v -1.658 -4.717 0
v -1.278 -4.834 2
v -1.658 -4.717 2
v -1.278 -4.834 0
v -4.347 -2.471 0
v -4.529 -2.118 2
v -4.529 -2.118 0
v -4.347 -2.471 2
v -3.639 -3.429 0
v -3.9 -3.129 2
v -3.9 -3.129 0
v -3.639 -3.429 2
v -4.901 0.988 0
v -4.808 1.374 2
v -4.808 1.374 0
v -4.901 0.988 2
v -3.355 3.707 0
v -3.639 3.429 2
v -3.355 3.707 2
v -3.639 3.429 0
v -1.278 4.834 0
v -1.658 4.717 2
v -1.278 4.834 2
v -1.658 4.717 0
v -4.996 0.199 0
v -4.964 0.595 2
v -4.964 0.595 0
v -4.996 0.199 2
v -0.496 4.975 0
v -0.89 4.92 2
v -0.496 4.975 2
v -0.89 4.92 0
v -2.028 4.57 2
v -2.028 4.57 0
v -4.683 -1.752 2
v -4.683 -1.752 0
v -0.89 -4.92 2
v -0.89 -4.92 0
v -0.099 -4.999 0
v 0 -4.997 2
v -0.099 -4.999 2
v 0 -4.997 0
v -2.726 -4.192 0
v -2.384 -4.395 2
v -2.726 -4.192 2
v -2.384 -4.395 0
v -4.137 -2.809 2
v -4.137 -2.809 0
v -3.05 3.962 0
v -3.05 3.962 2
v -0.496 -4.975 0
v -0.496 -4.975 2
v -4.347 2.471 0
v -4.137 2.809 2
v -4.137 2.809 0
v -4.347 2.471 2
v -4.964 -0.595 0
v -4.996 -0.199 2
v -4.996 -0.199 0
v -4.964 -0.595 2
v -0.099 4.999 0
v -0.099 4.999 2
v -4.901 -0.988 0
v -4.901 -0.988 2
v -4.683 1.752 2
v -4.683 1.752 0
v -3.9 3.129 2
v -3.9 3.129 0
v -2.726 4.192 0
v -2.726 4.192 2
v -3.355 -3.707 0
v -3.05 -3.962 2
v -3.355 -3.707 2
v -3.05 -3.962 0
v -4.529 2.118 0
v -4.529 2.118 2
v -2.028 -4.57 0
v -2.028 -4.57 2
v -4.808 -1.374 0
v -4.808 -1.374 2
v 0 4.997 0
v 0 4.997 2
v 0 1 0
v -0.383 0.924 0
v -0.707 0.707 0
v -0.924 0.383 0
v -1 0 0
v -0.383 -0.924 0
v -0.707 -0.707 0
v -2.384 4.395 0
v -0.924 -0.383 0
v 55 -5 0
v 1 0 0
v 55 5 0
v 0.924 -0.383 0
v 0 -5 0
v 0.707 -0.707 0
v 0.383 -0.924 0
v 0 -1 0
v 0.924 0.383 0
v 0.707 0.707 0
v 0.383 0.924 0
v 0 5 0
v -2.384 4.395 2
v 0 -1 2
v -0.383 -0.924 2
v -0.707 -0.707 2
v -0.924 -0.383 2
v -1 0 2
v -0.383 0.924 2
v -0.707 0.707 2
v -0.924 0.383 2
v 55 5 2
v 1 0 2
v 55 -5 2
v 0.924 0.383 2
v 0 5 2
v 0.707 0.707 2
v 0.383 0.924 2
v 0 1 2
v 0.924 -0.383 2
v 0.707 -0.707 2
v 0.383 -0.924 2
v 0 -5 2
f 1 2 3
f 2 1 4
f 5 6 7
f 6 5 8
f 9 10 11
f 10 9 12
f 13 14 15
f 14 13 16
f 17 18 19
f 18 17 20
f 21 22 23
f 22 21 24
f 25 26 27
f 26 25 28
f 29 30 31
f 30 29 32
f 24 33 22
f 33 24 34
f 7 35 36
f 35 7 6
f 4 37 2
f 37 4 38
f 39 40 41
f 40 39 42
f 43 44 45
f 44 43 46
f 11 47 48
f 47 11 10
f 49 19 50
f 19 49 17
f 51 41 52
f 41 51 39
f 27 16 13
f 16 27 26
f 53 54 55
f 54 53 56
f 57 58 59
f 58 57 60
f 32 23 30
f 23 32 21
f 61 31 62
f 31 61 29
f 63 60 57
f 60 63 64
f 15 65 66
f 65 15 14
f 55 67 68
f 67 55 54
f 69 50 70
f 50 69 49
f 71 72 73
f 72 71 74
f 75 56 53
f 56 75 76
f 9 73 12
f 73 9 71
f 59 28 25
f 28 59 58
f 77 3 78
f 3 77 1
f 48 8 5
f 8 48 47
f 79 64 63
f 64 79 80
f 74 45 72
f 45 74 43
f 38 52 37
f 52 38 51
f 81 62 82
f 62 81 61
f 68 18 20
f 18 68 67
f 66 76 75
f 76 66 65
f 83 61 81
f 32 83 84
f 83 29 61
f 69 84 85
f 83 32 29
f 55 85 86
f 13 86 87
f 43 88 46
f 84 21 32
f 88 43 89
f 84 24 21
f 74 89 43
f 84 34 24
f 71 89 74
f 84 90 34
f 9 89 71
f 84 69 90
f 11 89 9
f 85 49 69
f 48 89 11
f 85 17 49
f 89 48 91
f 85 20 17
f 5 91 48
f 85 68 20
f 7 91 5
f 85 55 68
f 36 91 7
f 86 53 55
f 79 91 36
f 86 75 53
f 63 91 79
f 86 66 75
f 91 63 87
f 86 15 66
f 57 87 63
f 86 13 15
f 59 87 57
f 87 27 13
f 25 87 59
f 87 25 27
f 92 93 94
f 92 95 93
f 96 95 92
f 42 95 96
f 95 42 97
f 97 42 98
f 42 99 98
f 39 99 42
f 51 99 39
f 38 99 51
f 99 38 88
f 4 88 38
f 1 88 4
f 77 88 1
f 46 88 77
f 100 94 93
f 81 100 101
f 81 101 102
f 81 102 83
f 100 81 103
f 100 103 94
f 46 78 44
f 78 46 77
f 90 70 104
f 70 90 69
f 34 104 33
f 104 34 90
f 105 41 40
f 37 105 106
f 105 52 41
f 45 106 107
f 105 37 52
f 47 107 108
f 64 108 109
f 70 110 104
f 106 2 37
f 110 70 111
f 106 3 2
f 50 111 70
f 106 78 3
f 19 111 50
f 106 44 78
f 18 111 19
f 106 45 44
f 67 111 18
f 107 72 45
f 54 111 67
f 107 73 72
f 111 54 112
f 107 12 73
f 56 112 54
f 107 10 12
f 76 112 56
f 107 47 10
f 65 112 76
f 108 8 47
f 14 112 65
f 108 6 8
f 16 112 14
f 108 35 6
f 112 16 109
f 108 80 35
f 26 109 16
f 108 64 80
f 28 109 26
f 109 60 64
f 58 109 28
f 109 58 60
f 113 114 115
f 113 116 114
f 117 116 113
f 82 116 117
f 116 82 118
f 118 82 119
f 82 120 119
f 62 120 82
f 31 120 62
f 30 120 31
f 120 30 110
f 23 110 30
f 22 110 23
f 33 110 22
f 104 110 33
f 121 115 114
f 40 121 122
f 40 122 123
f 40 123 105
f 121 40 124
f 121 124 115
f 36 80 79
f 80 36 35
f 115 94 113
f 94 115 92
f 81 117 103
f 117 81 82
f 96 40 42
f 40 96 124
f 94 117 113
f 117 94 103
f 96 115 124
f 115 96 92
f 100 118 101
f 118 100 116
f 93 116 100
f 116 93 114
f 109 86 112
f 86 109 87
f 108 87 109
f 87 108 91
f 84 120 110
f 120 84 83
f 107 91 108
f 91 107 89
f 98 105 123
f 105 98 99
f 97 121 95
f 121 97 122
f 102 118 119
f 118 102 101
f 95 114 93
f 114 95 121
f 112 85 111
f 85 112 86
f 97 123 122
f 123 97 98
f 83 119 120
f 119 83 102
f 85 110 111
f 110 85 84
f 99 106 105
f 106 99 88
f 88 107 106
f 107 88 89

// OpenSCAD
//############################################################################## 
//                       Odometer - Magnet Holder Tool
//############################################################################## 
// 
// Odometer for the toy car Tamiya TT-02. The odometer can be mounted at the
// differential output shaft.
//
// This part is a tool, to hold a single magnet for various tests.
//

module MagnetHolderTool(args) {
    $fa = 4;
    $fs = 0.4;

    difference() {
        union() {
            cylinder(d=10, h=2);
            translate([0, -5, 0]) 
            cube(size=[55, 10, 2]);
        }

        cylinder(d=2, h=10, center=true);
    }
}

MagnetHolderTool();
